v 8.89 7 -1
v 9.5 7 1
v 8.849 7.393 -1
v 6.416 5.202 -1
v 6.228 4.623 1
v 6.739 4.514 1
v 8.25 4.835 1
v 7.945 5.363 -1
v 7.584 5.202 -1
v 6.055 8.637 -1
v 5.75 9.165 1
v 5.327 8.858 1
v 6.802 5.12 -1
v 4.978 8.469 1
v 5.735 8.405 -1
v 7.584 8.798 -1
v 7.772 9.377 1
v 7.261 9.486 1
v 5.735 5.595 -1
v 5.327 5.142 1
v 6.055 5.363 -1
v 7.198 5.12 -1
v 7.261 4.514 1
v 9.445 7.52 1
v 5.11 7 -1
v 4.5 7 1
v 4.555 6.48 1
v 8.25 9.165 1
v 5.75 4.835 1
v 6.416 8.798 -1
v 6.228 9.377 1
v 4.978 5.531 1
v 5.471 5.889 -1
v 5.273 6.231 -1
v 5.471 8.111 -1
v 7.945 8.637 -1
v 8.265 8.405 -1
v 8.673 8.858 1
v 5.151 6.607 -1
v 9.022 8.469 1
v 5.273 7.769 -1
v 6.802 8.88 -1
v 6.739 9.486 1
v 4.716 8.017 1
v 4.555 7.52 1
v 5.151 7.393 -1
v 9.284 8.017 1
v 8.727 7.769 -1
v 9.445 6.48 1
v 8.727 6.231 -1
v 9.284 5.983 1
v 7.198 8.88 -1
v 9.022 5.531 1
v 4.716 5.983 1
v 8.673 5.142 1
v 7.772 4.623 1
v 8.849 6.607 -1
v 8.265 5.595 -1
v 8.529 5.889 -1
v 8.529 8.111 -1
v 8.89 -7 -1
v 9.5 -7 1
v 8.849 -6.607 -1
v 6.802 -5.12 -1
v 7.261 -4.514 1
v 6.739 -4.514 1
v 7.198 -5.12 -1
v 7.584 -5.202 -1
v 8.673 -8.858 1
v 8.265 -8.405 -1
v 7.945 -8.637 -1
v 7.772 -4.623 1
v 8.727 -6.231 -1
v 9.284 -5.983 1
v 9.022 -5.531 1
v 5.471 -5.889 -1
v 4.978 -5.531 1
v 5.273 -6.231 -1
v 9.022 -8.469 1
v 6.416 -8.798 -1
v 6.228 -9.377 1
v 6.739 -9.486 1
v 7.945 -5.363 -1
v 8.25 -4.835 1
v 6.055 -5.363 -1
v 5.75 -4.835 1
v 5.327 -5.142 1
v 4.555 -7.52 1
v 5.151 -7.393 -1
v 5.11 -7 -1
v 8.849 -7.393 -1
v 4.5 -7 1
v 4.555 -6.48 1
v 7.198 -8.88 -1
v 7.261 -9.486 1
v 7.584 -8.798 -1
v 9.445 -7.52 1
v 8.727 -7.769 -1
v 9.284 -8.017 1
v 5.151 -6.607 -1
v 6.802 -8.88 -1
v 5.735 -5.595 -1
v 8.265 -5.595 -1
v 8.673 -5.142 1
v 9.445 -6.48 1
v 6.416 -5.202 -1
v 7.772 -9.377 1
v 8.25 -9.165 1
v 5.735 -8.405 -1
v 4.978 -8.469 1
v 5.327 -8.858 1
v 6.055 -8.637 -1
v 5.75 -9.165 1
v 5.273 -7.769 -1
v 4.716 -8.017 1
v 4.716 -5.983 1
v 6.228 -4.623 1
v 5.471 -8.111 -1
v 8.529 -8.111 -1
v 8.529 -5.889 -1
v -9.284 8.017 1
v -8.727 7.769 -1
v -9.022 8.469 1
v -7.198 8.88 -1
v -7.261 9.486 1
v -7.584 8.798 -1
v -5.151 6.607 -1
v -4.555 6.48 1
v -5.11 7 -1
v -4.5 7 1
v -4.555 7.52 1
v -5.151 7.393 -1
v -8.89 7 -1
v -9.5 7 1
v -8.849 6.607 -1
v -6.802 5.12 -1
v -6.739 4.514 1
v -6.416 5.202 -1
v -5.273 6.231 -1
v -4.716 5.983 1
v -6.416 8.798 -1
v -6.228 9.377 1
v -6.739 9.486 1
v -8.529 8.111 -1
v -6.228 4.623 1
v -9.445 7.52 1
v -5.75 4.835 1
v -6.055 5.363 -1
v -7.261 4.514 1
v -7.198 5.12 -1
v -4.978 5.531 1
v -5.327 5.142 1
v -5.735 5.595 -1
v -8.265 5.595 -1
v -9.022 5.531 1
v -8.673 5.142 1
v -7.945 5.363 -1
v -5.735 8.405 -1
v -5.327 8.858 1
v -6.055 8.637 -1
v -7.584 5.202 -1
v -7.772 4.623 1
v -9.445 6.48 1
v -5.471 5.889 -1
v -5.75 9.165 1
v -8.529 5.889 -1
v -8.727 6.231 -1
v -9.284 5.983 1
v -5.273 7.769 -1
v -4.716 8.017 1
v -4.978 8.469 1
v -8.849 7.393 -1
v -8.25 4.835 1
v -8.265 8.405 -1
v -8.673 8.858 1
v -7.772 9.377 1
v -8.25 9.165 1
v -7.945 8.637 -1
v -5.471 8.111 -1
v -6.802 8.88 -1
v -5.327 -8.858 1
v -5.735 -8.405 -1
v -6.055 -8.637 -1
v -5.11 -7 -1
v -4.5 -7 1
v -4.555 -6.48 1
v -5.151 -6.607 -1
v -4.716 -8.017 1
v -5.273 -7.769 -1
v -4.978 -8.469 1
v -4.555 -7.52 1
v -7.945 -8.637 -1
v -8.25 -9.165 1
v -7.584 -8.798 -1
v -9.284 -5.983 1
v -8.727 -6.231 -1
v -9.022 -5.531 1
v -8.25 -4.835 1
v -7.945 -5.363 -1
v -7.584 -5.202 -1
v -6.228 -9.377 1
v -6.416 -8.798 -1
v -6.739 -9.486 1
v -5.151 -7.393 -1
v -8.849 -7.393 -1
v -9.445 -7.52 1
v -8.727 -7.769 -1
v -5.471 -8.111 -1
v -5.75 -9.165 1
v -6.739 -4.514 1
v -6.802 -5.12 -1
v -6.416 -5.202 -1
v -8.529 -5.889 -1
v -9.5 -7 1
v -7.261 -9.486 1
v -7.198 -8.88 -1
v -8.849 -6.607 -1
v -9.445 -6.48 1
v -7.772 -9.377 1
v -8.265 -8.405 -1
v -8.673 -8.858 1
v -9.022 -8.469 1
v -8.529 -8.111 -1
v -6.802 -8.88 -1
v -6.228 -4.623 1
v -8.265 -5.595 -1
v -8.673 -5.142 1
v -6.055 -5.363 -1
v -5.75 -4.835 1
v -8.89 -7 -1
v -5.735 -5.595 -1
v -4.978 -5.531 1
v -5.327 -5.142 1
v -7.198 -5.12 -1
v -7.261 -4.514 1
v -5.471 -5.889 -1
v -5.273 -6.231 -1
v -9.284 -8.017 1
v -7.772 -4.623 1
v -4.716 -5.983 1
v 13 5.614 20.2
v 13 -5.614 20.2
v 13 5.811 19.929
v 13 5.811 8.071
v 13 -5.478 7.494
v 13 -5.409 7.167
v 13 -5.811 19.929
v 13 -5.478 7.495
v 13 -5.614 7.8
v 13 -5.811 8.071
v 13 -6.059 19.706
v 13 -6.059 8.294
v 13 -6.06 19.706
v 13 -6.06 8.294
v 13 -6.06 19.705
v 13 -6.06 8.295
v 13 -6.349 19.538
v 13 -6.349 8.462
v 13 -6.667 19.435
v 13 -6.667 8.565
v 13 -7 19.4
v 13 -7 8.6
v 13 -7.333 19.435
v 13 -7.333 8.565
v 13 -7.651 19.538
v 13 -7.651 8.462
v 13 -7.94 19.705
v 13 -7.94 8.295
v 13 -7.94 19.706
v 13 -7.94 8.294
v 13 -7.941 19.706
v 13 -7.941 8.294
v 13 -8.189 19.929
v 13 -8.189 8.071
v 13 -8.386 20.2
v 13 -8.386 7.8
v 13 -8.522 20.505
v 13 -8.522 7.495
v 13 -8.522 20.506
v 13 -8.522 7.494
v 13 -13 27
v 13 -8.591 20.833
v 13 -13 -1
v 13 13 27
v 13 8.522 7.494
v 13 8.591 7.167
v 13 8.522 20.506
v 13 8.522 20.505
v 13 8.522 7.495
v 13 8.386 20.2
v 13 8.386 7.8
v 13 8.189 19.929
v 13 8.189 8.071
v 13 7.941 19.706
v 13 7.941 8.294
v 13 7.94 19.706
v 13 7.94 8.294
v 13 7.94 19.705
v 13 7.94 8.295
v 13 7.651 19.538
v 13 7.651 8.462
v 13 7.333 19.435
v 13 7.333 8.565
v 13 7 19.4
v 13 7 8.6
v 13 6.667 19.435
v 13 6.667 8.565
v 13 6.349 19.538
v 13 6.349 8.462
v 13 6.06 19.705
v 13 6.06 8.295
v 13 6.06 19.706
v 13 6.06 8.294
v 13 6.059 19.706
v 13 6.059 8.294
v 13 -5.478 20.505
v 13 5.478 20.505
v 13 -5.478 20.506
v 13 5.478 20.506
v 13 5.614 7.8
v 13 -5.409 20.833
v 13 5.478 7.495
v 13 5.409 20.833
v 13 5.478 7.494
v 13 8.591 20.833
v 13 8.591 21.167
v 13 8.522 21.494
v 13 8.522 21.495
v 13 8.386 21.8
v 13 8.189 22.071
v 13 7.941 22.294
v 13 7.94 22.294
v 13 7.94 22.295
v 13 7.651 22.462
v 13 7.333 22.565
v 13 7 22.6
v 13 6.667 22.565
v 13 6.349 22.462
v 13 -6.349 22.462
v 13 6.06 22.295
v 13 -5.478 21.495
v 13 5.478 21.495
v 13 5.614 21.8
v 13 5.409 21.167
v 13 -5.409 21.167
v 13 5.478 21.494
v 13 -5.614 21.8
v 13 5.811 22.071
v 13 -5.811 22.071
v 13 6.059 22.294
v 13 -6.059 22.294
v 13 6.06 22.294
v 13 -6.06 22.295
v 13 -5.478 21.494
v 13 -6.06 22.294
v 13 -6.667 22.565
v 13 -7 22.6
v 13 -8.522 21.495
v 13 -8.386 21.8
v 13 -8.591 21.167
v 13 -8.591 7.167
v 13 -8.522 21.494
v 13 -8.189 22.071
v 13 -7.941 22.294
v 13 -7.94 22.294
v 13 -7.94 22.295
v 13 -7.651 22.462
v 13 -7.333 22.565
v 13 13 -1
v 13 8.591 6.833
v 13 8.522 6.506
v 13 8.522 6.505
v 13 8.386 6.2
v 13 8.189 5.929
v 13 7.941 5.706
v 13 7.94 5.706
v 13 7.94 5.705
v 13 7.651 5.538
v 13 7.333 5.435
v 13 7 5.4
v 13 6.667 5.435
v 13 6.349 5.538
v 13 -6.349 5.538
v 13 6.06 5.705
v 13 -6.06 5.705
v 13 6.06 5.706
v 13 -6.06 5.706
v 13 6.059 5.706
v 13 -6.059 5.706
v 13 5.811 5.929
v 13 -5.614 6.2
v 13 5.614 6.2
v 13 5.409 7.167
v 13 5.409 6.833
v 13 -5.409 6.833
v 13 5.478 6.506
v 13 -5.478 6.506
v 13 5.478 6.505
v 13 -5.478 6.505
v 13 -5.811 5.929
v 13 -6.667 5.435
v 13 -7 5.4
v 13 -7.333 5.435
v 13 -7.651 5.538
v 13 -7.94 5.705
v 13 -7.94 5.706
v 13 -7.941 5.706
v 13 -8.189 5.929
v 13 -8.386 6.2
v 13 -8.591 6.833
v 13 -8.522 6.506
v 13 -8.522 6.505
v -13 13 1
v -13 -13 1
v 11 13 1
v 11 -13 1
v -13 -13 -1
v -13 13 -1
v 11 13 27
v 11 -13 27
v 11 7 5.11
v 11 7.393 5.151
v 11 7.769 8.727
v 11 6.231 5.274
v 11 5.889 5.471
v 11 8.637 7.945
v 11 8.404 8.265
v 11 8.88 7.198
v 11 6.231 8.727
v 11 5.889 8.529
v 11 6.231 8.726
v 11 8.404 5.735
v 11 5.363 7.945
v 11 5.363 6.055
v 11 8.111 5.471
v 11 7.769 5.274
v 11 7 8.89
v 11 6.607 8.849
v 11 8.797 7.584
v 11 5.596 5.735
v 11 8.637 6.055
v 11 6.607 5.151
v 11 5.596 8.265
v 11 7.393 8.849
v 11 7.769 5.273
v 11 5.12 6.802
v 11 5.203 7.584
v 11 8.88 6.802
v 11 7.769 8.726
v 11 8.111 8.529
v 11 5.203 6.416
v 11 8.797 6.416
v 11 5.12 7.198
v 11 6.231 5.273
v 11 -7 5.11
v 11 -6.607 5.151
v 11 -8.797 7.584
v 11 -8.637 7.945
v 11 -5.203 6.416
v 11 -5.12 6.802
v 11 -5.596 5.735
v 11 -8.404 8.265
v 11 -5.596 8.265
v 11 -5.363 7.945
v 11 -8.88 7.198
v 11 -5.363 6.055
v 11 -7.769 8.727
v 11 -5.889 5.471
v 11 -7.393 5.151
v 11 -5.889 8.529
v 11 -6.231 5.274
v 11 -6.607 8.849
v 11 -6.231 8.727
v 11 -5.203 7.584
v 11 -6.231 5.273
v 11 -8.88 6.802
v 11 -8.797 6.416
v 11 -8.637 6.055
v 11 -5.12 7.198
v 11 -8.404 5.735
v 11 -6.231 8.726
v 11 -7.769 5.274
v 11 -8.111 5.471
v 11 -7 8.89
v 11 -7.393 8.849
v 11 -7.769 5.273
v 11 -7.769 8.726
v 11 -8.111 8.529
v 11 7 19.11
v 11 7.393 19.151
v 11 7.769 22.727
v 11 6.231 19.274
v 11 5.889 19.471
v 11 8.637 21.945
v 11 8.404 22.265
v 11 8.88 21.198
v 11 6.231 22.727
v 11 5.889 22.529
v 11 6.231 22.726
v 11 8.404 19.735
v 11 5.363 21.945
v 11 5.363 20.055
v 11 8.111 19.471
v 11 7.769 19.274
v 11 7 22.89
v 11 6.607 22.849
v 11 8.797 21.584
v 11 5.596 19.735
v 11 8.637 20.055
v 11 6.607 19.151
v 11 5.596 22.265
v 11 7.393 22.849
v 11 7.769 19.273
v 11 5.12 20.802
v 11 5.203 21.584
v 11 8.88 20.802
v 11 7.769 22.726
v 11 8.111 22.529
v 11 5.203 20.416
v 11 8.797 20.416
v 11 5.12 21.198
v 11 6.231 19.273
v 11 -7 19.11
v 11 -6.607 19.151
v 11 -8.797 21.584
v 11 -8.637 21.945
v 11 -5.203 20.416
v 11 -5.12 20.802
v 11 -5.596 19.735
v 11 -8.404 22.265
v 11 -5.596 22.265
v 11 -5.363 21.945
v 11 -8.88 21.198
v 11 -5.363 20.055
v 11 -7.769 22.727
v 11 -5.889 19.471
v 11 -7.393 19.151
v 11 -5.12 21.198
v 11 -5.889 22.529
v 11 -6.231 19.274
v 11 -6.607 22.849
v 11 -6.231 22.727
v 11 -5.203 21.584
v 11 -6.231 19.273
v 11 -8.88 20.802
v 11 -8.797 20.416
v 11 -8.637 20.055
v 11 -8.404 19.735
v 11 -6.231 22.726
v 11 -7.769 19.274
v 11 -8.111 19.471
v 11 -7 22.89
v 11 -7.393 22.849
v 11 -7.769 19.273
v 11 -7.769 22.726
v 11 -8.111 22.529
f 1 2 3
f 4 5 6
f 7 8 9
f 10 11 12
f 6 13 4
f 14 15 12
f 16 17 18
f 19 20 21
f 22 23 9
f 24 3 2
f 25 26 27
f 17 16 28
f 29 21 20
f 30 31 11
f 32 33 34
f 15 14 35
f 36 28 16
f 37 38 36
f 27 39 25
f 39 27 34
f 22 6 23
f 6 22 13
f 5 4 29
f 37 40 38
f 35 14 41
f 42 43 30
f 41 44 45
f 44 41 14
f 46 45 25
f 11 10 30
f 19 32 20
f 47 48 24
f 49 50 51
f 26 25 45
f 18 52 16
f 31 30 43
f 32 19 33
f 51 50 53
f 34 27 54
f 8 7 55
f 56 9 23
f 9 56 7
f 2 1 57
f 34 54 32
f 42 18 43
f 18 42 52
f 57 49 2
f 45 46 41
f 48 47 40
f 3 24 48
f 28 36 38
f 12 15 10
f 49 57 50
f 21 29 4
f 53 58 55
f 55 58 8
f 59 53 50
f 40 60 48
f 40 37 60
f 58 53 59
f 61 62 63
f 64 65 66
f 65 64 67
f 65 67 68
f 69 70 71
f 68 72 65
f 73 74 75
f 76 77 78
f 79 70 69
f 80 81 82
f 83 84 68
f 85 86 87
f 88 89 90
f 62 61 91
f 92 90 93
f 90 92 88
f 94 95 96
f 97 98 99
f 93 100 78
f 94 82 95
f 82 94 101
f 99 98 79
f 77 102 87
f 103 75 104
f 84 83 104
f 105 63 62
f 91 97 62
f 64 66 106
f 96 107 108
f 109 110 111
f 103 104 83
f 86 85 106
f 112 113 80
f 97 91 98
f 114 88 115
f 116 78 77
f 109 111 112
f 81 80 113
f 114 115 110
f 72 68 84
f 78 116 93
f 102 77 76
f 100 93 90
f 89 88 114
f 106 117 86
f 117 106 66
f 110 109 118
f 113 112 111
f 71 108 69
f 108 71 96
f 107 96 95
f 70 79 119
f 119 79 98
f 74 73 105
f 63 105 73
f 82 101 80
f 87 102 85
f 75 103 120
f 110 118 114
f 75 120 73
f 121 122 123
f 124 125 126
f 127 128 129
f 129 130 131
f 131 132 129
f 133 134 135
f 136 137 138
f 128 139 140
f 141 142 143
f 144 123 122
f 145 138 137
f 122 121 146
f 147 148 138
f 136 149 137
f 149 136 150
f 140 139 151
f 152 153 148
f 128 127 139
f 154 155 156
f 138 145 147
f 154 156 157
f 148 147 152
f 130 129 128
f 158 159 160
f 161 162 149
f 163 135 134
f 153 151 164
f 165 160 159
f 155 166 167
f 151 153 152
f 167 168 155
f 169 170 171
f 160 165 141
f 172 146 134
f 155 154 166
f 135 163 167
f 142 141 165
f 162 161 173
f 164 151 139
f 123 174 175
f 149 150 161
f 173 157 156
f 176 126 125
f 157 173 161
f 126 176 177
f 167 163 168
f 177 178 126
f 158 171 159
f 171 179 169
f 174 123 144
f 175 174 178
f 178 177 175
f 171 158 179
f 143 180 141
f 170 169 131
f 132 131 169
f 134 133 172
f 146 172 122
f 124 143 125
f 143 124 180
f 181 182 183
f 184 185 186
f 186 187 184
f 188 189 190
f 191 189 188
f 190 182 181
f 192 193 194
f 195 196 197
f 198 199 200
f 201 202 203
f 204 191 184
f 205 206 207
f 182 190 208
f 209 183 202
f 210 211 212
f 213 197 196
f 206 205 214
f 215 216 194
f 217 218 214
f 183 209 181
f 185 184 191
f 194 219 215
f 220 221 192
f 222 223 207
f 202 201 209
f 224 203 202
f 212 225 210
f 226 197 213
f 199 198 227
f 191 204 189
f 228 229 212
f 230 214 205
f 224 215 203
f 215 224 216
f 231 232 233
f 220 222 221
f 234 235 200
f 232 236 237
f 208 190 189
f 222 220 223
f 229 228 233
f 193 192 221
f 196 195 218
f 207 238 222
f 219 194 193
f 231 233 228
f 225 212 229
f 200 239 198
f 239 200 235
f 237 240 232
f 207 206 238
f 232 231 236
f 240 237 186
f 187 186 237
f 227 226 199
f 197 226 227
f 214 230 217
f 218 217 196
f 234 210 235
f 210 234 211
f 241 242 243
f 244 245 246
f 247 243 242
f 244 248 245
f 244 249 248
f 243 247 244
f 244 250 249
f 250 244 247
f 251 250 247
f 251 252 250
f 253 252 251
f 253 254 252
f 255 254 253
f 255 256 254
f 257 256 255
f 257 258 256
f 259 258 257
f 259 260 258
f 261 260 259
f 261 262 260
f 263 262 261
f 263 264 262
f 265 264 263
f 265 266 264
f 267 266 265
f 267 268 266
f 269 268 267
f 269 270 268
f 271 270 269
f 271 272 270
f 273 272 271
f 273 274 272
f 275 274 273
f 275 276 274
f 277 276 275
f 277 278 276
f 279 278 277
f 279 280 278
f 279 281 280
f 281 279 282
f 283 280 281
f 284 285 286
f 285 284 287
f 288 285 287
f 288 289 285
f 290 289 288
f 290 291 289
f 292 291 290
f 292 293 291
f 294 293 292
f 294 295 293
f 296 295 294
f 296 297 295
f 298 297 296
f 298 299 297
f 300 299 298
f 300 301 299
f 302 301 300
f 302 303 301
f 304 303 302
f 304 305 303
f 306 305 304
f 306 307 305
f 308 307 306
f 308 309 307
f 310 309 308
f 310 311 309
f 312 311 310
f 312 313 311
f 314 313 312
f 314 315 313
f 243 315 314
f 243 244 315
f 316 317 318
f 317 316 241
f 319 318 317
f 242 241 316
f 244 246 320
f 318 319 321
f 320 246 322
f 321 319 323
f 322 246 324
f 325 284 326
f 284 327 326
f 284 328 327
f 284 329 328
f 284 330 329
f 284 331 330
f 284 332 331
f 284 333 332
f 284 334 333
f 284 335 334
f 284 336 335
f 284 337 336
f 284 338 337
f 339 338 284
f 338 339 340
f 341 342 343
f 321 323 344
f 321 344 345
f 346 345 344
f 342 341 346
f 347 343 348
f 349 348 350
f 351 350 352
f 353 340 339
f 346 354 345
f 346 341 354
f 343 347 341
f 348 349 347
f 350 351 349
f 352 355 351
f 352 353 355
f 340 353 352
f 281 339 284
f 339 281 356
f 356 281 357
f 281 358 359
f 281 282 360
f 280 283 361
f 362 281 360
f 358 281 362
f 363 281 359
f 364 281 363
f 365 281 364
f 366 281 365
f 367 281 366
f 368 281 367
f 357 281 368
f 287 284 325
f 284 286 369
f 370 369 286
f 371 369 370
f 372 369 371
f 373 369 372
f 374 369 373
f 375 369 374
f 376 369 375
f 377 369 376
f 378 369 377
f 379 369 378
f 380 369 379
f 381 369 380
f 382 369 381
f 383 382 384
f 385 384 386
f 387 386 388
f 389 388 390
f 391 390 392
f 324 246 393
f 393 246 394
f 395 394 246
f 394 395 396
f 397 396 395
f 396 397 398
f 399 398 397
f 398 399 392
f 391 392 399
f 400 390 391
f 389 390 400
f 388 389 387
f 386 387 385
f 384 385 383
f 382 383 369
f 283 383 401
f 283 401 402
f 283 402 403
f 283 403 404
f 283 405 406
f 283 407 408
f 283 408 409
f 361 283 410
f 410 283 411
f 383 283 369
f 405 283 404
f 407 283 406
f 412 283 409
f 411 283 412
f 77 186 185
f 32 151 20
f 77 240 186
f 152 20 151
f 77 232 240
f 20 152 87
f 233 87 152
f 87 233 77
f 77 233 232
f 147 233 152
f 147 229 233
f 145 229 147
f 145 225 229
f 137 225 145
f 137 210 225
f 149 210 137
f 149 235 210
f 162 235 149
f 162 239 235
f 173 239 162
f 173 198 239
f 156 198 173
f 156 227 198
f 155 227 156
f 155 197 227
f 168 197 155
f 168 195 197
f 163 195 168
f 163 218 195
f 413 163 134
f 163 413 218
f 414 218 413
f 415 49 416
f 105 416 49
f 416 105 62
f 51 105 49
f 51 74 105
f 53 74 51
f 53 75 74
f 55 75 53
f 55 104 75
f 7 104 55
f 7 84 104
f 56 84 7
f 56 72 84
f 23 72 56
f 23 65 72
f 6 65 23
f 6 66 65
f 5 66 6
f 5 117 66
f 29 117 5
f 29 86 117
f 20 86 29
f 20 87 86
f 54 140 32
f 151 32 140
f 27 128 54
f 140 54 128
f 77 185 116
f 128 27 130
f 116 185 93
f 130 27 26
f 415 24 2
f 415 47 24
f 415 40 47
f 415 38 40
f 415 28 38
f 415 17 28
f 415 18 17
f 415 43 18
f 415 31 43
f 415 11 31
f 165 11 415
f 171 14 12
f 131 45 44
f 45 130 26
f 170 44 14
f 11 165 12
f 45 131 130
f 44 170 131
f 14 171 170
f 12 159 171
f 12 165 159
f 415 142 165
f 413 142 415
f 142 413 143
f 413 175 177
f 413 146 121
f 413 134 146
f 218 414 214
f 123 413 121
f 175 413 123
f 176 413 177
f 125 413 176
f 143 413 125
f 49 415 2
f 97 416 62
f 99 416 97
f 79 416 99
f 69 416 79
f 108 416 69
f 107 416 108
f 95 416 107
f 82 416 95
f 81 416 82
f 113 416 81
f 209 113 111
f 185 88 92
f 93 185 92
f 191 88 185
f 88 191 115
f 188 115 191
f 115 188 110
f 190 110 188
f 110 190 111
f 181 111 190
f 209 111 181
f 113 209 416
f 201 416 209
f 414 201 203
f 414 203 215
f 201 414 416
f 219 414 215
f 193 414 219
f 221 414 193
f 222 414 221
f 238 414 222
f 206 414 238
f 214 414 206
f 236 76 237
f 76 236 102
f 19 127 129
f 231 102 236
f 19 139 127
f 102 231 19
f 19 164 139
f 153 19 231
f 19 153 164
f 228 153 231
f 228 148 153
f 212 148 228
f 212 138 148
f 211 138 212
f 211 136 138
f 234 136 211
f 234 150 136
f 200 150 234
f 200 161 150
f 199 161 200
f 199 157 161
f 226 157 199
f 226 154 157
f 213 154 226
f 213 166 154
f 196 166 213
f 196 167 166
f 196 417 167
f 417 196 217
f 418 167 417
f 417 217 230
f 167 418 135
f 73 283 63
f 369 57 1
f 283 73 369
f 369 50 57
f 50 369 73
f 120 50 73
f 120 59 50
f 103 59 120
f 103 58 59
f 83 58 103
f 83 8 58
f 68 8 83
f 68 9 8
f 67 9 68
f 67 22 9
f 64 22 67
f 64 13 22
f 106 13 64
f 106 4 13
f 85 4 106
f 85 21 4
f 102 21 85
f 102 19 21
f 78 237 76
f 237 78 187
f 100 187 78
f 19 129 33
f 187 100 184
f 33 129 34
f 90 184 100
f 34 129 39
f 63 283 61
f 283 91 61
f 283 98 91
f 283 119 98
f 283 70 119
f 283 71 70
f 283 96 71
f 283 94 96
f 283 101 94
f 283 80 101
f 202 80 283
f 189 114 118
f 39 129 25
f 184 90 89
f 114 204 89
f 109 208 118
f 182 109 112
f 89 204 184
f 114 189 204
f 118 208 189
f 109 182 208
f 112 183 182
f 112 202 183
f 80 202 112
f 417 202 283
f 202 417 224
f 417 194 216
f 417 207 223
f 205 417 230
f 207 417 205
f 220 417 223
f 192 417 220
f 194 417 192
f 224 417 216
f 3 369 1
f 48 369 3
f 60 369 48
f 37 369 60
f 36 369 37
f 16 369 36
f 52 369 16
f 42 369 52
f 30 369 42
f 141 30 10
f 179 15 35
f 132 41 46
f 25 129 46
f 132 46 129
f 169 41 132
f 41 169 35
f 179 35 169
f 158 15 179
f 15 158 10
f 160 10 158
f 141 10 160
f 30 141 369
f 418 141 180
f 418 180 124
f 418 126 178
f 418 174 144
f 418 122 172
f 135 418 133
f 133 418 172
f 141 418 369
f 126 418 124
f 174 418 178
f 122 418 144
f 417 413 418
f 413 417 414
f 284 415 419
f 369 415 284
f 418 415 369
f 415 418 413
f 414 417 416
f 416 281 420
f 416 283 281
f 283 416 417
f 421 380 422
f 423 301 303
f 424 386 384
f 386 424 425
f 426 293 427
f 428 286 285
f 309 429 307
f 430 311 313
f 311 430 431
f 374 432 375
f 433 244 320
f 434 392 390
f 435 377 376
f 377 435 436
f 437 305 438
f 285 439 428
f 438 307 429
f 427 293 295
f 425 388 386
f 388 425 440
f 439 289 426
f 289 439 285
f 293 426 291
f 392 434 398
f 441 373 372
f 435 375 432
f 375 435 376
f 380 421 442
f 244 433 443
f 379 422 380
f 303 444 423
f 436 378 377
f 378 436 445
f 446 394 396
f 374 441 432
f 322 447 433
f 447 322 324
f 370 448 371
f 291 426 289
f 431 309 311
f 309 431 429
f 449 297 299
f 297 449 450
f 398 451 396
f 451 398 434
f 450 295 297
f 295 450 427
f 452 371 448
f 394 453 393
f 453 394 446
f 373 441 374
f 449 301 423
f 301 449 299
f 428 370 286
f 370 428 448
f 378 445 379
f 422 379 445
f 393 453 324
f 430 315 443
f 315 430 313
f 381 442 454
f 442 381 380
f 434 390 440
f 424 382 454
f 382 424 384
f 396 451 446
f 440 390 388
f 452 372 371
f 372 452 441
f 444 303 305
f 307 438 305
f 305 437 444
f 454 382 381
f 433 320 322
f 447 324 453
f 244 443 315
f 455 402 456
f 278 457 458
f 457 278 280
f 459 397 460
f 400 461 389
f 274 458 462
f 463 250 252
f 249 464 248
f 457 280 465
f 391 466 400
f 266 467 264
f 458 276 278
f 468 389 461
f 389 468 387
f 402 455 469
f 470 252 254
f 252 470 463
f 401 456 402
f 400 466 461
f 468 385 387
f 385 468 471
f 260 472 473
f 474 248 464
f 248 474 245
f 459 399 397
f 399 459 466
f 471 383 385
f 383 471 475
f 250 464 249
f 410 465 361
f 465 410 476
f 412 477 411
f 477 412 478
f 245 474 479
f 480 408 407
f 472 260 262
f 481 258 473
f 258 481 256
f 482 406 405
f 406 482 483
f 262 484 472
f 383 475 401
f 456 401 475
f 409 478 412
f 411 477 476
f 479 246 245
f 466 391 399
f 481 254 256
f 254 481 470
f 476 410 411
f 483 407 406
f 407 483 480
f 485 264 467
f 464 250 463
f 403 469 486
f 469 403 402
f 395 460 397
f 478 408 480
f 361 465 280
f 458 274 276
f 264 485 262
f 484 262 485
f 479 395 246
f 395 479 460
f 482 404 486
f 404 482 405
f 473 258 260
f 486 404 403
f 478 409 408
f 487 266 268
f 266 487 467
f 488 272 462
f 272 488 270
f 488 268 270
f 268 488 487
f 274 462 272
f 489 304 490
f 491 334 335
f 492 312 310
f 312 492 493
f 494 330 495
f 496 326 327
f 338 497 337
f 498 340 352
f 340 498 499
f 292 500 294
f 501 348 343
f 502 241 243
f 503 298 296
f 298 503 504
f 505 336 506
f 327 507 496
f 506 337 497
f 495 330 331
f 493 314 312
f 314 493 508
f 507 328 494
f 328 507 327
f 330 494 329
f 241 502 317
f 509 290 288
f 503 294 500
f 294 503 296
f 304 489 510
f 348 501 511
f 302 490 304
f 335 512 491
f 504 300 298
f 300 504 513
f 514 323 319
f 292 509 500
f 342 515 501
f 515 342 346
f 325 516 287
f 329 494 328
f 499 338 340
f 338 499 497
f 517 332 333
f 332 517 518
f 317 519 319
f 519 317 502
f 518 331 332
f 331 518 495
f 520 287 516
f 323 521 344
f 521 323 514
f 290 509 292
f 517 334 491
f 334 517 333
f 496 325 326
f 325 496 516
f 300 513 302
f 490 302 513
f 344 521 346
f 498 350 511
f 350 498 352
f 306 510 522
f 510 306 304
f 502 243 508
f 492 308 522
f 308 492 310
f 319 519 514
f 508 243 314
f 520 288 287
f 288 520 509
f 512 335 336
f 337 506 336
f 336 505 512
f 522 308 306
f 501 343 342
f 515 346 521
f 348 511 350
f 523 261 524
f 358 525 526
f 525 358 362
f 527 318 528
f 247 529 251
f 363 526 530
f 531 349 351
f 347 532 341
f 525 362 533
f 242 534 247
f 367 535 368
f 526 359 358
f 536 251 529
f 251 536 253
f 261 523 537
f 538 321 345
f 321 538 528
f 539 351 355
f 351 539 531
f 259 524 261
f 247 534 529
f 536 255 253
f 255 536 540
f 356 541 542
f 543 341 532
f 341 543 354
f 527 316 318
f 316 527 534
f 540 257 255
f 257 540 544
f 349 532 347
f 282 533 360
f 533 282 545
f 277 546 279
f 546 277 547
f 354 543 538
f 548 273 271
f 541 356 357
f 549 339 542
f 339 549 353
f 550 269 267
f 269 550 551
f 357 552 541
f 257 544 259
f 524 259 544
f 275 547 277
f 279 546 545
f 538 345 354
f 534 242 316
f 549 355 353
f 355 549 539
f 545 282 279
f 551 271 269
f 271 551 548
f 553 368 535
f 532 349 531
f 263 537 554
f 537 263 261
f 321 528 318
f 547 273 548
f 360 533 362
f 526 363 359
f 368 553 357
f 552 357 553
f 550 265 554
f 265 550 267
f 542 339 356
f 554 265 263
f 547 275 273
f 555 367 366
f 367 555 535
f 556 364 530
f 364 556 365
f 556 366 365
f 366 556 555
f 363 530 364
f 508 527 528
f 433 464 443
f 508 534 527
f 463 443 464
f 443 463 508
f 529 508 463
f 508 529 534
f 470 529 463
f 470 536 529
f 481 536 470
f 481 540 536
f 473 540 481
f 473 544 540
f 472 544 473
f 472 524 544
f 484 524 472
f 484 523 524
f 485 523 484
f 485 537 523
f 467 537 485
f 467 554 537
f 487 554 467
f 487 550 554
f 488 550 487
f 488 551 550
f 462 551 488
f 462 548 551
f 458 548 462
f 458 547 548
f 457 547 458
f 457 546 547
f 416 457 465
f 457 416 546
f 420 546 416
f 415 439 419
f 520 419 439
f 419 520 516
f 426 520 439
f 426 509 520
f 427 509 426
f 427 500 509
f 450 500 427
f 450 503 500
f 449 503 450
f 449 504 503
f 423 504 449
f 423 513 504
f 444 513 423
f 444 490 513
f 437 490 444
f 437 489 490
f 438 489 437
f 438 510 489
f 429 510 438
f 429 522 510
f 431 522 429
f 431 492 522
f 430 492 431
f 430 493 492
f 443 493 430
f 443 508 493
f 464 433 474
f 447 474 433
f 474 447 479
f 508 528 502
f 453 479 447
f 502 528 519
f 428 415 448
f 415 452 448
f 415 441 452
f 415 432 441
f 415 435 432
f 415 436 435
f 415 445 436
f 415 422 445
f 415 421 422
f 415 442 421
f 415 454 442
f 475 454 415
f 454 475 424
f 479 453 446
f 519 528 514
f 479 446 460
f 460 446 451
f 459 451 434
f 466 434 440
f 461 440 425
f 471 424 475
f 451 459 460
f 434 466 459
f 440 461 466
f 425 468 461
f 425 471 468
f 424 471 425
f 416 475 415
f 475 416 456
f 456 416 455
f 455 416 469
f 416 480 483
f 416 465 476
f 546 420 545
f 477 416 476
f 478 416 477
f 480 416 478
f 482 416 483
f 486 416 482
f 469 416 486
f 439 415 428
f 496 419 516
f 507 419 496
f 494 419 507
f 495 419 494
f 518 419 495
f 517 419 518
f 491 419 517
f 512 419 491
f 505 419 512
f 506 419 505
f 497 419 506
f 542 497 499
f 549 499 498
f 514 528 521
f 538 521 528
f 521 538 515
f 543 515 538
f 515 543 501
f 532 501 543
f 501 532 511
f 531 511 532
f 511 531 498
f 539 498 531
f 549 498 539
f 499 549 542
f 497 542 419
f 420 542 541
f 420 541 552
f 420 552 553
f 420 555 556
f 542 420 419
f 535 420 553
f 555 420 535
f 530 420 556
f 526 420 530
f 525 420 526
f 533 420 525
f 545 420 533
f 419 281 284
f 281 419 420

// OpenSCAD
LEN = 26;

SWITCH_HOLE_D1 = 3.78;
SWITCH_HOLE_D2 = 5;
MOUNT_HOLE_D = 3.2;
HOLE_DIST = 14;
HOLE_D = 3.78;

NOZZLE_D = 0.4;

WALL_THICKNESS = NOZZLE_D * 5;

CUT = 0.001;

module plate(d1, d2) {
  difference() {
    cube([LEN, LEN, WALL_THICKNESS], center=true);
    for (x = [1, -1]) {
      for (y = [1, -1]) {
        translate([HOLE_DIST / 2 * x, HOLE_DIST / 2 * y, 0]) {
          cylinder(h=WALL_THICKNESS+CUT, d1=HOLE_D, d2=d2, center=true, $fn=30);
        }
      }
    }
  }
}

union() {
  plate(d1=SWITCH_HOLE_D1, d2=SWITCH_HOLE_D2);
  rotate([0, 90, 0])
    translate([-(LEN + WALL_THICKNESS) / 2, 0, (LEN - WALL_THICKNESS) / 2 ])
      plate(d1=MOUNT_HOLE_D, d2=MOUNT_HOLE_D);
}
